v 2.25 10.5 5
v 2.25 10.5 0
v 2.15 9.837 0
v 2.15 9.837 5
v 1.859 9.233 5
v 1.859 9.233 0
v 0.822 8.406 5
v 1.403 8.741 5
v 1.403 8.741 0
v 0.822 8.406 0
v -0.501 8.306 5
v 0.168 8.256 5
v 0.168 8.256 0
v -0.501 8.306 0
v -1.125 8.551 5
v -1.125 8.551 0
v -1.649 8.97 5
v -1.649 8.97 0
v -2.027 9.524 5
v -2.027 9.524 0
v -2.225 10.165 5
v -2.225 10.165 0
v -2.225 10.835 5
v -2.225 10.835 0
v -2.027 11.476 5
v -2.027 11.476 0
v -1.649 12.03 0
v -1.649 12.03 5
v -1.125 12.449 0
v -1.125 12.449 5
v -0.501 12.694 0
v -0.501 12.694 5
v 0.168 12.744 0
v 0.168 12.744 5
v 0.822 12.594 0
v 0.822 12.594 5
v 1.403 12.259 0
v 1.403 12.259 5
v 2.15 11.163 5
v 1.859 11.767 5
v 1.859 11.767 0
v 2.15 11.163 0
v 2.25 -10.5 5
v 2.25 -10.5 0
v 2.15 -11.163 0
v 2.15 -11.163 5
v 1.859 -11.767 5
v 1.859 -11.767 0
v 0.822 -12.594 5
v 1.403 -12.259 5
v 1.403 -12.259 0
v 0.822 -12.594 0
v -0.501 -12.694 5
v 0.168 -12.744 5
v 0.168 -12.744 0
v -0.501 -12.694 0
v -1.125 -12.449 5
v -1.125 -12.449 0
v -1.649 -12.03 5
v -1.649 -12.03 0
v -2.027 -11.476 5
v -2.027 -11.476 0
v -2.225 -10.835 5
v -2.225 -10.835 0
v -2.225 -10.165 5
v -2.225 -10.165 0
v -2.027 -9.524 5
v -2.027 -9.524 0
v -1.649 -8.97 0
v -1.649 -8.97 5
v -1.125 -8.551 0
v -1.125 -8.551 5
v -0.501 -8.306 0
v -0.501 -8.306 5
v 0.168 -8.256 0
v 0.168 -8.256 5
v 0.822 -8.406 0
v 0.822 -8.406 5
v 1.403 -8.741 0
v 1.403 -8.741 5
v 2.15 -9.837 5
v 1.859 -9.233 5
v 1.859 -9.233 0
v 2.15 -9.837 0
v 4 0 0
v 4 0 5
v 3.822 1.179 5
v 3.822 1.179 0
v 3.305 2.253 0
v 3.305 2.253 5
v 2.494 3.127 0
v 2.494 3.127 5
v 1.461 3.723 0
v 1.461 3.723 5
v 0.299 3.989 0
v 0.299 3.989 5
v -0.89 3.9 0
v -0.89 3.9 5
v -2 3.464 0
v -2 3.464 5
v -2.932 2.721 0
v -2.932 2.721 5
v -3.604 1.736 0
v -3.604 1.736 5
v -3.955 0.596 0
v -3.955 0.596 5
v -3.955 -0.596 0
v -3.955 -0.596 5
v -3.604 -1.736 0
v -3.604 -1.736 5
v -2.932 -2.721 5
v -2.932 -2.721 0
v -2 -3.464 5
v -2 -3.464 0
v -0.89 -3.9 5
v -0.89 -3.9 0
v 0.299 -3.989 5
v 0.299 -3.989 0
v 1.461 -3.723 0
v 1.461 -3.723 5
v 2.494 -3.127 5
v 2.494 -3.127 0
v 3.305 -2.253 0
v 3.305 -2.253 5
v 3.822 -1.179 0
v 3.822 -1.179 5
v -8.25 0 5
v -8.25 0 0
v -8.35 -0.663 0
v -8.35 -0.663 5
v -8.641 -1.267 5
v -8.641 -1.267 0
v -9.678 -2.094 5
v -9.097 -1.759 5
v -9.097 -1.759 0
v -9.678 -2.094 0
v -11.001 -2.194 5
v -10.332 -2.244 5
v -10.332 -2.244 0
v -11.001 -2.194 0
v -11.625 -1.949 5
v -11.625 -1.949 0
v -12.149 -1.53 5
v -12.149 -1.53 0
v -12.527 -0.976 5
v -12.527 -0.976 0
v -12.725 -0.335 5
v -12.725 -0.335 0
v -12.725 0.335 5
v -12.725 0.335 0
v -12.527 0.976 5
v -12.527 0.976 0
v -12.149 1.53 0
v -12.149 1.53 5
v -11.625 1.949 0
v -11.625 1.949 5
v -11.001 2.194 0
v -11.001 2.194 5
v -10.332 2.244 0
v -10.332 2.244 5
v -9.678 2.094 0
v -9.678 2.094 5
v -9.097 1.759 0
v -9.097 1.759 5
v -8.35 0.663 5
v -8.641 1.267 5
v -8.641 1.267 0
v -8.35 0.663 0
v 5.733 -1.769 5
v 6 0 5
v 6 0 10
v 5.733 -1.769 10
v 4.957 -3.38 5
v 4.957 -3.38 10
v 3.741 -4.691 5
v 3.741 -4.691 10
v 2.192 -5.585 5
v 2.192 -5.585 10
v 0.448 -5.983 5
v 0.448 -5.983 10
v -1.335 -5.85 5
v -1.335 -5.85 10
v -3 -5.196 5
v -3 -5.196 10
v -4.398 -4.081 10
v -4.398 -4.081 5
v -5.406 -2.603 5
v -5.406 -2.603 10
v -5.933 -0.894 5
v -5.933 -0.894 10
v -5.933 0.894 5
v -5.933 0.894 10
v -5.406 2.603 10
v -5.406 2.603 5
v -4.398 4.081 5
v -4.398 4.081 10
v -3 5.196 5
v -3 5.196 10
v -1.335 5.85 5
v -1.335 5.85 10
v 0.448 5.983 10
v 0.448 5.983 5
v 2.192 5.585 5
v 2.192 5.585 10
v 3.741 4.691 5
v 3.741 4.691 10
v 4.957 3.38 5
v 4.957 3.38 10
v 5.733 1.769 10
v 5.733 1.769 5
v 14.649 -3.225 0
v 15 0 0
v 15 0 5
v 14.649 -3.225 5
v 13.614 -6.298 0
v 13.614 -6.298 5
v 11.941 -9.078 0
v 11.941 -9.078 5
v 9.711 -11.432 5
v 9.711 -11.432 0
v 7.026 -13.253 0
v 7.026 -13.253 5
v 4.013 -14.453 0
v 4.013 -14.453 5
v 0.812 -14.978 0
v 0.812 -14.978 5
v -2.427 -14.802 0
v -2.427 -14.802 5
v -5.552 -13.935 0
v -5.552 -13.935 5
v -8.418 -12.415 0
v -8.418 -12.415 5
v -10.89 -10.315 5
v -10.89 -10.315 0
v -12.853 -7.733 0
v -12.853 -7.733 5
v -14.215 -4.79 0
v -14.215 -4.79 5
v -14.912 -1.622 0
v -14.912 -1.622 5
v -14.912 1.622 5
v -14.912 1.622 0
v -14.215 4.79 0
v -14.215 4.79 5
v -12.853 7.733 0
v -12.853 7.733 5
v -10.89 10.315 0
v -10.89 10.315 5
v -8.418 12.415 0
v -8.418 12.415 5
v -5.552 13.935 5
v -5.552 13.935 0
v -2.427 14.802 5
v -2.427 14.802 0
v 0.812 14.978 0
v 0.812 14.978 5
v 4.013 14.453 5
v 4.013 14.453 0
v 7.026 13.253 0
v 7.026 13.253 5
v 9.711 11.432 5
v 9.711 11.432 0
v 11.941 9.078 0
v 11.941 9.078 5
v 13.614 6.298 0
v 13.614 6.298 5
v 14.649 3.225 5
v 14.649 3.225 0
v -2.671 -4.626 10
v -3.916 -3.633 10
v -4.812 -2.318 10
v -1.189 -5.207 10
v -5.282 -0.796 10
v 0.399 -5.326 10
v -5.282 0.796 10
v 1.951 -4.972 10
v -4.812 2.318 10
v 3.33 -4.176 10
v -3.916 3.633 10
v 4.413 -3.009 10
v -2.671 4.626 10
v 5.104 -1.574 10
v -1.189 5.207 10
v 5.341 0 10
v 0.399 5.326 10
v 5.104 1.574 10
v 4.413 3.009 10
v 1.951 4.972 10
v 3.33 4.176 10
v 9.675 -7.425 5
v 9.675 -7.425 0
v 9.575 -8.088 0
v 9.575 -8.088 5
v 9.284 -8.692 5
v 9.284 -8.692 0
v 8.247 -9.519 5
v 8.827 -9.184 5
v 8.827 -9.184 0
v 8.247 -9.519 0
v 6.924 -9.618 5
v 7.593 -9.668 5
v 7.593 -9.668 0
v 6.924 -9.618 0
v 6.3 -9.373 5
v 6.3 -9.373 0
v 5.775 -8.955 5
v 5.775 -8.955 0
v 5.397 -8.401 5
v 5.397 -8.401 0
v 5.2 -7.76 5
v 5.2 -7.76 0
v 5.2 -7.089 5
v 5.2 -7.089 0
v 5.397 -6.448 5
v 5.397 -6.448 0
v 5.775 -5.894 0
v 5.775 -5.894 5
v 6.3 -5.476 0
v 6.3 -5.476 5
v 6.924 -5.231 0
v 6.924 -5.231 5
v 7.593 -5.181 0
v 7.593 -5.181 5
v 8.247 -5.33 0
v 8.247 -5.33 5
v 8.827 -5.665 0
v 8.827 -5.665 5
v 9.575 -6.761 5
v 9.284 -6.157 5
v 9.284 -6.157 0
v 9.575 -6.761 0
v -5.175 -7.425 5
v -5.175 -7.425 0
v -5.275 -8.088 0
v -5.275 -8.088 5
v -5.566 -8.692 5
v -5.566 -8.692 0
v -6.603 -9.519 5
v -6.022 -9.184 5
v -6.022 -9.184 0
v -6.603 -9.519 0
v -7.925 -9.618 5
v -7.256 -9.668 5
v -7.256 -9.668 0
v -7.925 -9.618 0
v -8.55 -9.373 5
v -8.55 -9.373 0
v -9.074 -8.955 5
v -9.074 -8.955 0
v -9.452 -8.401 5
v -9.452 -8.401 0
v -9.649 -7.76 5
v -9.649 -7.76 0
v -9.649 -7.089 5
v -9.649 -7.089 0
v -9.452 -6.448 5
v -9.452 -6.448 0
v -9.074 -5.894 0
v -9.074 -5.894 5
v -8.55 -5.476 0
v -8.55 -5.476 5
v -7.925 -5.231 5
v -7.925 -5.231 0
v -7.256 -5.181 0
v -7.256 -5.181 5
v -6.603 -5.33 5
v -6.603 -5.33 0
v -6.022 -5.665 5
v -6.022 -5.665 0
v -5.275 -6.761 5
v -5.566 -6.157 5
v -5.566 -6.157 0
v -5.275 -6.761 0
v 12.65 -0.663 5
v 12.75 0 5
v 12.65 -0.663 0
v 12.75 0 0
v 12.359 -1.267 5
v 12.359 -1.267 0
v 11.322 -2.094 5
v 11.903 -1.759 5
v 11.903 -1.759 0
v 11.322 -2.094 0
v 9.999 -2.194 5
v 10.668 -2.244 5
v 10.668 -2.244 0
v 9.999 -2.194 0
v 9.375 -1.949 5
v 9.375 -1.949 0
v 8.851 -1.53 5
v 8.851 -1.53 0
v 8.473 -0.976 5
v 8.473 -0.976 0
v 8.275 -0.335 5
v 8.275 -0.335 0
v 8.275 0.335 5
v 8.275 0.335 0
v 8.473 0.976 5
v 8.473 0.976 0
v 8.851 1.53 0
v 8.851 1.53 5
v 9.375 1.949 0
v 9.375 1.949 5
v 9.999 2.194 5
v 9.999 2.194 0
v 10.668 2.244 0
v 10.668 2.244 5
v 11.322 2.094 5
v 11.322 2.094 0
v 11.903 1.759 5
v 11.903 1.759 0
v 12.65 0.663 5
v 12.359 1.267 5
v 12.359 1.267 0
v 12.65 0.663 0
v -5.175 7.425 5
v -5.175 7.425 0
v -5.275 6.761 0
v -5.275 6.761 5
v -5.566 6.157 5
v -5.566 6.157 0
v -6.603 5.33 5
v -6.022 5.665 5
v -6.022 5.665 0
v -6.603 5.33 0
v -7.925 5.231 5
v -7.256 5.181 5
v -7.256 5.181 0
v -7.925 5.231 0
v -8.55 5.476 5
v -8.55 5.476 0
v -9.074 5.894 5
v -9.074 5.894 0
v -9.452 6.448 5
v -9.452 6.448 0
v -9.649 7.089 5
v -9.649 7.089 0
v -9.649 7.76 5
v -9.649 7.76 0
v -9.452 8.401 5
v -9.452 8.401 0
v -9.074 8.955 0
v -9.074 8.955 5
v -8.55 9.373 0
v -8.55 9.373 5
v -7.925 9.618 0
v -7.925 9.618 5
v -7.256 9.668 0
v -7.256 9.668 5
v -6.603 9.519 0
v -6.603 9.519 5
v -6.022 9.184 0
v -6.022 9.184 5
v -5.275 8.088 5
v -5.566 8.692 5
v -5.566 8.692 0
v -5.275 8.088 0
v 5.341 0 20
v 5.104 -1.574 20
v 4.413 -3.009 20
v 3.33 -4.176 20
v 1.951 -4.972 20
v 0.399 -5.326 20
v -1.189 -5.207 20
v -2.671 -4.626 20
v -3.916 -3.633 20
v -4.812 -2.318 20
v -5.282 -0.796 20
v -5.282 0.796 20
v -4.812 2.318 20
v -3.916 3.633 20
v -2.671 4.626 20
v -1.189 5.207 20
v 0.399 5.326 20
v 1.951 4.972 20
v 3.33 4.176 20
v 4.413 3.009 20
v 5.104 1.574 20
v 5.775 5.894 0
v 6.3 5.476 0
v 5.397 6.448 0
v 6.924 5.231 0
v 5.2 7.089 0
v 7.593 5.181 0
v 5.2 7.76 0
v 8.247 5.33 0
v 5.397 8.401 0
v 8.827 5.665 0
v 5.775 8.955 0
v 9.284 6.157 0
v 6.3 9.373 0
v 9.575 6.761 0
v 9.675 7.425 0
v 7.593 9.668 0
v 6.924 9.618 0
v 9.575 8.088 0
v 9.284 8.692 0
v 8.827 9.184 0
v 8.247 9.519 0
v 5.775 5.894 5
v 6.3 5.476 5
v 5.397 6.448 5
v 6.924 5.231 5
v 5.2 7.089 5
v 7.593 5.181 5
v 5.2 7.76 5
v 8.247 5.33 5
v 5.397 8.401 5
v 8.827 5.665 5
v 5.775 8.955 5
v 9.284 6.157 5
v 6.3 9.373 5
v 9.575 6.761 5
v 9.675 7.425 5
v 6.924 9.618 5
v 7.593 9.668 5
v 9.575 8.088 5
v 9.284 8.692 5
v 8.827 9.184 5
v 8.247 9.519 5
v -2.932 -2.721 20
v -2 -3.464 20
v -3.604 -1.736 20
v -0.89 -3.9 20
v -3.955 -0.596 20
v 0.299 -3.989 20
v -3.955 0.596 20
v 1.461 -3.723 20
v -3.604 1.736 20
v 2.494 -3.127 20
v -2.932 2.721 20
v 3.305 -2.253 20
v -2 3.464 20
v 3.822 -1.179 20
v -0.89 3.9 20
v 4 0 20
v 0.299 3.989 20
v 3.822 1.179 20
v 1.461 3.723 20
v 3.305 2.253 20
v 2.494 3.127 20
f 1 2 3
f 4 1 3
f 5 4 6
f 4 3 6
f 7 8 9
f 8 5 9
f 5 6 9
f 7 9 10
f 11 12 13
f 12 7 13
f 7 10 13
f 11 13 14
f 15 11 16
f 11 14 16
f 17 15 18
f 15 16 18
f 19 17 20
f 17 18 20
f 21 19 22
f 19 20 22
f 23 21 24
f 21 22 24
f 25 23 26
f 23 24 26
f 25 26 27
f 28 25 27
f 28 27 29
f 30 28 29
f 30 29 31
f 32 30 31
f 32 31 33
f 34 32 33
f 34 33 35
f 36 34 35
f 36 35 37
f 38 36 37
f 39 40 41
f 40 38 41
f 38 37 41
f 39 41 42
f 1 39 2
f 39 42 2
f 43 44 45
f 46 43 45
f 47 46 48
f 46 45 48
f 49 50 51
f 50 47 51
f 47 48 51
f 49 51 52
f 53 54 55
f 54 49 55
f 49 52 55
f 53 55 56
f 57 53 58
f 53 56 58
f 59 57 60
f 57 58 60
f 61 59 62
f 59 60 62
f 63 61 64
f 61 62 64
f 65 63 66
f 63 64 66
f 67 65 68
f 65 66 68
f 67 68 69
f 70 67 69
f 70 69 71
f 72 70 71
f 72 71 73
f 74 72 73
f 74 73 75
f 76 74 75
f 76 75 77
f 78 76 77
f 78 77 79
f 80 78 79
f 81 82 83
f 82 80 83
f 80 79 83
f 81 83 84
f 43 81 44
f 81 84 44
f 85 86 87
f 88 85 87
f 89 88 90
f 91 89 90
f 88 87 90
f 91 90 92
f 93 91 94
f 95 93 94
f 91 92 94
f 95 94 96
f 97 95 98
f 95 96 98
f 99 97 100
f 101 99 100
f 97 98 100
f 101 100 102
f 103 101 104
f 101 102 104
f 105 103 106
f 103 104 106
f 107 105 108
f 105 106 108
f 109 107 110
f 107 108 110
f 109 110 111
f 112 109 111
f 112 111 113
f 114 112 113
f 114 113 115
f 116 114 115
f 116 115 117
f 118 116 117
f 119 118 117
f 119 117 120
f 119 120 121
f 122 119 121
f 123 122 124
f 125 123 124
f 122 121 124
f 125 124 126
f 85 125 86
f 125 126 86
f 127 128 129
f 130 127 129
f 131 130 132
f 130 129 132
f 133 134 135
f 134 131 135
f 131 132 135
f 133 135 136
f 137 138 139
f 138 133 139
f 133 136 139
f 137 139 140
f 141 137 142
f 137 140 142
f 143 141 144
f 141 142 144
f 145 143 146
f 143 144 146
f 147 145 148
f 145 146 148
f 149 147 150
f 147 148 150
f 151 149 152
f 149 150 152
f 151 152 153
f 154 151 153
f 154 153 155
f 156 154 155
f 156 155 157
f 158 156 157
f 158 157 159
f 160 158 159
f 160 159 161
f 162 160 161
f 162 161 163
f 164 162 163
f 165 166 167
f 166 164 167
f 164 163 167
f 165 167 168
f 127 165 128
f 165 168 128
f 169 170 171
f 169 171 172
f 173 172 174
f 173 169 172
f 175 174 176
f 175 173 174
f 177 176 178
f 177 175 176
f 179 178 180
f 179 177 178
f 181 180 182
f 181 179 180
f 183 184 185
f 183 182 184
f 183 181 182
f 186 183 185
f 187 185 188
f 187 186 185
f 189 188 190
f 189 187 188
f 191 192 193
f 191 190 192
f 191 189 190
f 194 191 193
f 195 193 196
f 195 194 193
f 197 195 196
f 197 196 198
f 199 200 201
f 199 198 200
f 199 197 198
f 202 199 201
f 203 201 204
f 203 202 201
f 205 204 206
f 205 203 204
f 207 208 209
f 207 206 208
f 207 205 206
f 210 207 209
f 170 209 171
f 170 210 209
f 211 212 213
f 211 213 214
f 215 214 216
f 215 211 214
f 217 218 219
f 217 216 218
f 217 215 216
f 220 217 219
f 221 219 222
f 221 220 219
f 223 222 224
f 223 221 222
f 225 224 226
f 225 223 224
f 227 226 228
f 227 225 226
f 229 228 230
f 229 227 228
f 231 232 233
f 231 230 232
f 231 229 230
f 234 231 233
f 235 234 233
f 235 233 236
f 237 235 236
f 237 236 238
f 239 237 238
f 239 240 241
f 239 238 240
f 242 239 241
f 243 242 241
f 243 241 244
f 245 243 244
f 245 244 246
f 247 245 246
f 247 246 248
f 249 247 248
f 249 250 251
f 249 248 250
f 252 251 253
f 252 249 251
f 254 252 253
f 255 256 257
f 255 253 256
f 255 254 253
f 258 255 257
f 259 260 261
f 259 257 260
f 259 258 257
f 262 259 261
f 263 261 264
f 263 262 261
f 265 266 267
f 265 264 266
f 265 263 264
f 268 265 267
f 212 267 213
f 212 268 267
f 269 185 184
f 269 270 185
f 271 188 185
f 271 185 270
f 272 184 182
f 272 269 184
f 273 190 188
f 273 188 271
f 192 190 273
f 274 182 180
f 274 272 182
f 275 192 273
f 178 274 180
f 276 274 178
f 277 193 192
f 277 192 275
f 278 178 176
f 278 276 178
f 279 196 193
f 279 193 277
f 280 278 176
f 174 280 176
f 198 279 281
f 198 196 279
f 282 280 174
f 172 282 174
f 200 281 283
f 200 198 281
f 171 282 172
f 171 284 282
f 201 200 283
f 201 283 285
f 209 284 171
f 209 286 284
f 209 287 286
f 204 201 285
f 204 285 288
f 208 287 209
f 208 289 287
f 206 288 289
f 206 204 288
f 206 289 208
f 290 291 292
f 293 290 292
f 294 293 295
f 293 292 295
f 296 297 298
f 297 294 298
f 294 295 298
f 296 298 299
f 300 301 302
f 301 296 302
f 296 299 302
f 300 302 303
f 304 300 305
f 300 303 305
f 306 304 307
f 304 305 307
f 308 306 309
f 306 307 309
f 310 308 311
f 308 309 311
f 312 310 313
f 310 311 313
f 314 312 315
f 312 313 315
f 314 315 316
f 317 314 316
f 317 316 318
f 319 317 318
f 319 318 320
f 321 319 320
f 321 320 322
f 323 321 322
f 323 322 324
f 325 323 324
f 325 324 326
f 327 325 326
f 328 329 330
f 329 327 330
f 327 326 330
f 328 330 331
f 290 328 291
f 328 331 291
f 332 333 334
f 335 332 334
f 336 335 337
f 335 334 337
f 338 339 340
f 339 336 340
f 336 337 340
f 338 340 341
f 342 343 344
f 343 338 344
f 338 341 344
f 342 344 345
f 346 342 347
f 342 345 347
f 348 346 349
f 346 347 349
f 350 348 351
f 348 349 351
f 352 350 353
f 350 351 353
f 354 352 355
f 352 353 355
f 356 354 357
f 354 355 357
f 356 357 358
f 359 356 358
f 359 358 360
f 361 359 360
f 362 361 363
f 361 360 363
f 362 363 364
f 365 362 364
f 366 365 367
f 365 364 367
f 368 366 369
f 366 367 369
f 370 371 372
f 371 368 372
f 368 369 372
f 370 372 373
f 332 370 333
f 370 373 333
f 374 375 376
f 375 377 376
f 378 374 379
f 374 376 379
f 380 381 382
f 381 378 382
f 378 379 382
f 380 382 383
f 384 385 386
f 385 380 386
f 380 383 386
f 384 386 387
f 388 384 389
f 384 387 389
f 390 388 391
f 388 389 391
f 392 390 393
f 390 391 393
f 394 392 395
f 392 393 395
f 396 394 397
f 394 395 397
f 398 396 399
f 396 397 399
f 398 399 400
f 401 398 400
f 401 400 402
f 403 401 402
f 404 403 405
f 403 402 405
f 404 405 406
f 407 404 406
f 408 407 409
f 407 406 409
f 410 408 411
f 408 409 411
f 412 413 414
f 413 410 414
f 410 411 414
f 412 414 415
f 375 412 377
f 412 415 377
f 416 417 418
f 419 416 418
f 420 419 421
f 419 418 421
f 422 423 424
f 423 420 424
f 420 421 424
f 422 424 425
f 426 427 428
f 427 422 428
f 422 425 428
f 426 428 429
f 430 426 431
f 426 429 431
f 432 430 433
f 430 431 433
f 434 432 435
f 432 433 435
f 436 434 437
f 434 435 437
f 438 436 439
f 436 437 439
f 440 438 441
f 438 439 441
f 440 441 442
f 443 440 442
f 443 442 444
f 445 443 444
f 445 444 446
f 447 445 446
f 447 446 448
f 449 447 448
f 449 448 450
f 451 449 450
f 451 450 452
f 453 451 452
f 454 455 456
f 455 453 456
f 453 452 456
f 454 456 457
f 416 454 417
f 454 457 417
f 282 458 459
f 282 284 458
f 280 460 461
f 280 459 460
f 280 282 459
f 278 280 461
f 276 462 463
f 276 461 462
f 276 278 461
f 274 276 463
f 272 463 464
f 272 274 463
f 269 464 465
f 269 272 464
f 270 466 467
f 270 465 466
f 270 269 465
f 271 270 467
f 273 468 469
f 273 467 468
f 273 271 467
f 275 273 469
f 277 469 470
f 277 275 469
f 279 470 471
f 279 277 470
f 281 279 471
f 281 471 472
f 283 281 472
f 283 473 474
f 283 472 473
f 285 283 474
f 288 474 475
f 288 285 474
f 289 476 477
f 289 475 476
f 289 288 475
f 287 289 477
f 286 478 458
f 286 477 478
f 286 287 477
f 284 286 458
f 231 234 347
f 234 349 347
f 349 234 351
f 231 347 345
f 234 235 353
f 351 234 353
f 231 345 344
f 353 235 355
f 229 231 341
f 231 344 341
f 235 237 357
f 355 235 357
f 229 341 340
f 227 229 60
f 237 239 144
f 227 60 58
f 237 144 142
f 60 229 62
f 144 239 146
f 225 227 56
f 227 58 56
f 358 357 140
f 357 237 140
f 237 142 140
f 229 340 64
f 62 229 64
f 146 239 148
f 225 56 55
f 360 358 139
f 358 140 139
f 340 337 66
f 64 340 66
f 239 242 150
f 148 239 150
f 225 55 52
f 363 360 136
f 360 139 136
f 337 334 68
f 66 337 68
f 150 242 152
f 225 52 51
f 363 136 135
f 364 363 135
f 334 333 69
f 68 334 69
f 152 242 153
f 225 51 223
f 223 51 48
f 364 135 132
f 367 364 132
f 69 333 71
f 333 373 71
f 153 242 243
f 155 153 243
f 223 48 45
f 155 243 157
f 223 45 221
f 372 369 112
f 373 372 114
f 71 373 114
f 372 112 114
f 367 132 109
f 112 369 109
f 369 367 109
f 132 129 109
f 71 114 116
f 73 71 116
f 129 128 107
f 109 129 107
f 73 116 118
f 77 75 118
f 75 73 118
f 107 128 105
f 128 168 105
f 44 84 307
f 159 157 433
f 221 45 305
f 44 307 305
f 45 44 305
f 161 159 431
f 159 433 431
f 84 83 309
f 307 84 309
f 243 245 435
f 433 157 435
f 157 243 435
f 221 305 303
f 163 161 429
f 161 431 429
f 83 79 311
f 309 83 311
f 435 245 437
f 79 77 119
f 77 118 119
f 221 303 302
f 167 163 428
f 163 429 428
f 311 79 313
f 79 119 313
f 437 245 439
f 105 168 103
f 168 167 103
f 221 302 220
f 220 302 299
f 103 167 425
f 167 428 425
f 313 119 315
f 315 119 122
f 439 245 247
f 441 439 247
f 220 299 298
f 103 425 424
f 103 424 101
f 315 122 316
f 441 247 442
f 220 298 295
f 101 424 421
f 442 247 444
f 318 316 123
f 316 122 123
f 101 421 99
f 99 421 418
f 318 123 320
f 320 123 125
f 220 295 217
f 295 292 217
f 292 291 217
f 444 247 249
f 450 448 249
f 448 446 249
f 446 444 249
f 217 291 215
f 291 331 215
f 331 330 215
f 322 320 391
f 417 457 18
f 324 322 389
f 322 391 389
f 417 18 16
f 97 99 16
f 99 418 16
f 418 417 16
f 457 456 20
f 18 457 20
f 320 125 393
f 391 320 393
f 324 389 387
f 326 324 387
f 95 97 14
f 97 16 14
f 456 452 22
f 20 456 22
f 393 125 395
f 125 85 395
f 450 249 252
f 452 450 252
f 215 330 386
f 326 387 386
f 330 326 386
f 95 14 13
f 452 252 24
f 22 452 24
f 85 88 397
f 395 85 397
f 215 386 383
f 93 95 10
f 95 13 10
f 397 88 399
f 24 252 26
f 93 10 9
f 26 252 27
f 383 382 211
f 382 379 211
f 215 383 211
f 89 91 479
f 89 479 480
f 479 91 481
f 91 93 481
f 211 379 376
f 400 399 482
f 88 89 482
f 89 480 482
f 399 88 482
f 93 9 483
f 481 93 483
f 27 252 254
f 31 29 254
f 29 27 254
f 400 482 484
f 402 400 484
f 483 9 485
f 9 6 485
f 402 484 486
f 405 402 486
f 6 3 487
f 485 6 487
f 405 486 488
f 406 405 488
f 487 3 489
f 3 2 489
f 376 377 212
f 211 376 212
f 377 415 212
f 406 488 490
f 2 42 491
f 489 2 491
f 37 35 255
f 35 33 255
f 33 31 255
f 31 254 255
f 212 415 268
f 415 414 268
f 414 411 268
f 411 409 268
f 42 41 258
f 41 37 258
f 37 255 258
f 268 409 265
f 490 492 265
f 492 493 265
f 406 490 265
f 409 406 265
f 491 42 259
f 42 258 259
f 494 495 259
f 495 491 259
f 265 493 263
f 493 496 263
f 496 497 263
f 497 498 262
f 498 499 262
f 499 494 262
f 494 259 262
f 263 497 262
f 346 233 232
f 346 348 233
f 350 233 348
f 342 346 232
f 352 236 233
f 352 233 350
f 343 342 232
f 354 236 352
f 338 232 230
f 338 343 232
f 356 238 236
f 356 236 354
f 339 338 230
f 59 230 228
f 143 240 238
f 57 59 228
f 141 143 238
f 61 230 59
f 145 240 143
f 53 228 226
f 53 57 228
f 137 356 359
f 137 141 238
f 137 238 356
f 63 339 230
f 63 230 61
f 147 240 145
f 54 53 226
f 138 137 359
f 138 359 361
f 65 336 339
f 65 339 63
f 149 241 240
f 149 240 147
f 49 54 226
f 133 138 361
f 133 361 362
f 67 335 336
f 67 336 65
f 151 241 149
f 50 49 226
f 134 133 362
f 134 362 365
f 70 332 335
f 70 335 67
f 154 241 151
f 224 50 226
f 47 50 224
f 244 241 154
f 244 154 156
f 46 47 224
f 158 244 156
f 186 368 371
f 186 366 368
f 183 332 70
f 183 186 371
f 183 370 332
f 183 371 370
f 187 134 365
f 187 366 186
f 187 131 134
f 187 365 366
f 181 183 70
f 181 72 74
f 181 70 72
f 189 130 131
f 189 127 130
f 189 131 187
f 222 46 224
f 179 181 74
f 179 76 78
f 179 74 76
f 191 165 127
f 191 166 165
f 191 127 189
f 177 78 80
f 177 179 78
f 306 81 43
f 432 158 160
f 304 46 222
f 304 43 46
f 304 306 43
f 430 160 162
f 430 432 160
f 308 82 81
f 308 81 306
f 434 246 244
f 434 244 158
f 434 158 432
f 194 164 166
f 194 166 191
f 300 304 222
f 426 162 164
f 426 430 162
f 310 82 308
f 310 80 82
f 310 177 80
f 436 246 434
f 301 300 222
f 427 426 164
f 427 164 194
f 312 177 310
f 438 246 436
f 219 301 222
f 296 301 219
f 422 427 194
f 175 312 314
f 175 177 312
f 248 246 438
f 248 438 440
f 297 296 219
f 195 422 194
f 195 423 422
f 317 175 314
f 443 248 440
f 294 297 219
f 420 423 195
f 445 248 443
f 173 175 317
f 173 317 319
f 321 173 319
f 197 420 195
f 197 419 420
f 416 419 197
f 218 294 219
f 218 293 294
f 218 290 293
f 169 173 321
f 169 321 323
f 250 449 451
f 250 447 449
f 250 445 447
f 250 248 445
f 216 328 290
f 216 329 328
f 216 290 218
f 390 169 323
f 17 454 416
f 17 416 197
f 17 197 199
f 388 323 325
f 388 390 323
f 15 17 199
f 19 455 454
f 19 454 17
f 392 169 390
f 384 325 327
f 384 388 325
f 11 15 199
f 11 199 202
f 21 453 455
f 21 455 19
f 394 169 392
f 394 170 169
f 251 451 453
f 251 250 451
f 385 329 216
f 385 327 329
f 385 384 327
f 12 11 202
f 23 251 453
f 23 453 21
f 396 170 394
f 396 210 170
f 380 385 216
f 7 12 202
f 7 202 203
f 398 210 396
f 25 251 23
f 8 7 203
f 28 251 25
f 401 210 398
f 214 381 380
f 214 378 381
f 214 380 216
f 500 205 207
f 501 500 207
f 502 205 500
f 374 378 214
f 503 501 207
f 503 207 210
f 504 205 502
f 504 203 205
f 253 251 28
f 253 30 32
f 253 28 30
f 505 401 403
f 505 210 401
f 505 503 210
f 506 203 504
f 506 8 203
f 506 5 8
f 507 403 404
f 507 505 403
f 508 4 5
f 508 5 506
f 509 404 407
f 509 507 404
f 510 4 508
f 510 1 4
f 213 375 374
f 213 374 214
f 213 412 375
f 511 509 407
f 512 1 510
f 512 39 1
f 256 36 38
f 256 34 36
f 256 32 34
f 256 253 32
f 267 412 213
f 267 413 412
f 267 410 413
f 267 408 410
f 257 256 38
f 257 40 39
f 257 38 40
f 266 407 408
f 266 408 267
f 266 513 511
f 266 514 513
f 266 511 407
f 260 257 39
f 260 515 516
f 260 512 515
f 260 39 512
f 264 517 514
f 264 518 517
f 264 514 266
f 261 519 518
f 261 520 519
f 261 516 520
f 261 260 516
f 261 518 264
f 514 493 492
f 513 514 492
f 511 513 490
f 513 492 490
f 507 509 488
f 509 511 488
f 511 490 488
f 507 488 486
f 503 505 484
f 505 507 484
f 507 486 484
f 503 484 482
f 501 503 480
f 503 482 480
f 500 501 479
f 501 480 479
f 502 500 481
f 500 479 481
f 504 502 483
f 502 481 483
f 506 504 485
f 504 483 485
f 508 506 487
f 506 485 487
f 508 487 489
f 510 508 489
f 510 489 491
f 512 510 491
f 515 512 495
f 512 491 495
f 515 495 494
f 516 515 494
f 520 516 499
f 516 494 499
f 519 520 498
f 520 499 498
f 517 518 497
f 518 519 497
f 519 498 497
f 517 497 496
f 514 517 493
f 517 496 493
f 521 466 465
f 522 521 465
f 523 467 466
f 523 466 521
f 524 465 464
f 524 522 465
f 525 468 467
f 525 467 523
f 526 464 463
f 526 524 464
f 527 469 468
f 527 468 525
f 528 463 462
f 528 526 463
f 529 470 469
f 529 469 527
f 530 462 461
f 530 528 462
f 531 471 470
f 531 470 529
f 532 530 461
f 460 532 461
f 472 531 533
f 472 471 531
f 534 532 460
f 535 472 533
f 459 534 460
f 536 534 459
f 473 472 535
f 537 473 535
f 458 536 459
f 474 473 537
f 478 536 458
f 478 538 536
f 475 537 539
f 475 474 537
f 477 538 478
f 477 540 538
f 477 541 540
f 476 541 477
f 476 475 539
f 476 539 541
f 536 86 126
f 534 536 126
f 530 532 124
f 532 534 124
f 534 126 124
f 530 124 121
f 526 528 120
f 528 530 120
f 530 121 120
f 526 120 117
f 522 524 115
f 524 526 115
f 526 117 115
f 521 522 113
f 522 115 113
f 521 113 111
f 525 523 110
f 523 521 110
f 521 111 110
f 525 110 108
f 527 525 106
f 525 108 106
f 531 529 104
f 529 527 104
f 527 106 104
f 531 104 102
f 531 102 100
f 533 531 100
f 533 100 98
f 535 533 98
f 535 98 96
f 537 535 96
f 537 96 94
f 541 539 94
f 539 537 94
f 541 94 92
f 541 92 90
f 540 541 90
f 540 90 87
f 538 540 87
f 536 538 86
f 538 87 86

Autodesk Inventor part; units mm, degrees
ref_plane "YZ Plane" through (0, 0, 0) normal (1, 0, 0) x (0, 1, 0)
ref_plane "XZ Plane" through (0, 0, 0) normal (0, 1, 0) x (-1, 0, 0)
ref_plane "XY Plane" through (0, 0, 0) normal (0, 0, 1) x (1, 0, 0)
sketch "Sketch1" plane through (0, 0, 0) normal (0, 0, 1) x (1, 0, 0)
  circle A0 centre (0, 0) radius 15
  circle A1 centre (0, 10.5) radius 2.25
  circle A2 centre (-7.4246, 7.4246) radius 2.25
  circle A3 centre (-10.5, 0) radius 2.25
  circle A4 centre (-7.4246, -7.4246) radius 2.25
  circle A5 centre (0, -10.5) radius 2.25
  circle A6 centre (7.4246, -7.4246) radius 2.25
  circle A7 centre (10.5, 0) radius 2.25
  circle A8 centre (7.4246, 7.4246) radius 2.25
  dimension "d0" = 30
  dimension "d2" = 4.5
  dimension "d5" = 360
extrude "Extrusion1" add sketch "Sketch1" along normal blind 5
sketch "Sketch2" plane through (0, 0, 5) normal (0, 0, 1) x (1, 0, 0)
  circle A0 centre (0, 0) radius 4
  circle A1 centre (0, 0) radius 5.3414
  circle A2 centre (0, 0) radius 6
  dimension "d9" = 8
extrude "Extrusion2" add sketch "Sketch2" along normal blind 5 contours A2
extrude "Extrusion3" add sketch "Sketch2" along normal blind 15 contours A1
extrude "Extrusion4" cut sketch "Sketch2" against normal blind 21 contours A0
properties part number "Hubnew"
